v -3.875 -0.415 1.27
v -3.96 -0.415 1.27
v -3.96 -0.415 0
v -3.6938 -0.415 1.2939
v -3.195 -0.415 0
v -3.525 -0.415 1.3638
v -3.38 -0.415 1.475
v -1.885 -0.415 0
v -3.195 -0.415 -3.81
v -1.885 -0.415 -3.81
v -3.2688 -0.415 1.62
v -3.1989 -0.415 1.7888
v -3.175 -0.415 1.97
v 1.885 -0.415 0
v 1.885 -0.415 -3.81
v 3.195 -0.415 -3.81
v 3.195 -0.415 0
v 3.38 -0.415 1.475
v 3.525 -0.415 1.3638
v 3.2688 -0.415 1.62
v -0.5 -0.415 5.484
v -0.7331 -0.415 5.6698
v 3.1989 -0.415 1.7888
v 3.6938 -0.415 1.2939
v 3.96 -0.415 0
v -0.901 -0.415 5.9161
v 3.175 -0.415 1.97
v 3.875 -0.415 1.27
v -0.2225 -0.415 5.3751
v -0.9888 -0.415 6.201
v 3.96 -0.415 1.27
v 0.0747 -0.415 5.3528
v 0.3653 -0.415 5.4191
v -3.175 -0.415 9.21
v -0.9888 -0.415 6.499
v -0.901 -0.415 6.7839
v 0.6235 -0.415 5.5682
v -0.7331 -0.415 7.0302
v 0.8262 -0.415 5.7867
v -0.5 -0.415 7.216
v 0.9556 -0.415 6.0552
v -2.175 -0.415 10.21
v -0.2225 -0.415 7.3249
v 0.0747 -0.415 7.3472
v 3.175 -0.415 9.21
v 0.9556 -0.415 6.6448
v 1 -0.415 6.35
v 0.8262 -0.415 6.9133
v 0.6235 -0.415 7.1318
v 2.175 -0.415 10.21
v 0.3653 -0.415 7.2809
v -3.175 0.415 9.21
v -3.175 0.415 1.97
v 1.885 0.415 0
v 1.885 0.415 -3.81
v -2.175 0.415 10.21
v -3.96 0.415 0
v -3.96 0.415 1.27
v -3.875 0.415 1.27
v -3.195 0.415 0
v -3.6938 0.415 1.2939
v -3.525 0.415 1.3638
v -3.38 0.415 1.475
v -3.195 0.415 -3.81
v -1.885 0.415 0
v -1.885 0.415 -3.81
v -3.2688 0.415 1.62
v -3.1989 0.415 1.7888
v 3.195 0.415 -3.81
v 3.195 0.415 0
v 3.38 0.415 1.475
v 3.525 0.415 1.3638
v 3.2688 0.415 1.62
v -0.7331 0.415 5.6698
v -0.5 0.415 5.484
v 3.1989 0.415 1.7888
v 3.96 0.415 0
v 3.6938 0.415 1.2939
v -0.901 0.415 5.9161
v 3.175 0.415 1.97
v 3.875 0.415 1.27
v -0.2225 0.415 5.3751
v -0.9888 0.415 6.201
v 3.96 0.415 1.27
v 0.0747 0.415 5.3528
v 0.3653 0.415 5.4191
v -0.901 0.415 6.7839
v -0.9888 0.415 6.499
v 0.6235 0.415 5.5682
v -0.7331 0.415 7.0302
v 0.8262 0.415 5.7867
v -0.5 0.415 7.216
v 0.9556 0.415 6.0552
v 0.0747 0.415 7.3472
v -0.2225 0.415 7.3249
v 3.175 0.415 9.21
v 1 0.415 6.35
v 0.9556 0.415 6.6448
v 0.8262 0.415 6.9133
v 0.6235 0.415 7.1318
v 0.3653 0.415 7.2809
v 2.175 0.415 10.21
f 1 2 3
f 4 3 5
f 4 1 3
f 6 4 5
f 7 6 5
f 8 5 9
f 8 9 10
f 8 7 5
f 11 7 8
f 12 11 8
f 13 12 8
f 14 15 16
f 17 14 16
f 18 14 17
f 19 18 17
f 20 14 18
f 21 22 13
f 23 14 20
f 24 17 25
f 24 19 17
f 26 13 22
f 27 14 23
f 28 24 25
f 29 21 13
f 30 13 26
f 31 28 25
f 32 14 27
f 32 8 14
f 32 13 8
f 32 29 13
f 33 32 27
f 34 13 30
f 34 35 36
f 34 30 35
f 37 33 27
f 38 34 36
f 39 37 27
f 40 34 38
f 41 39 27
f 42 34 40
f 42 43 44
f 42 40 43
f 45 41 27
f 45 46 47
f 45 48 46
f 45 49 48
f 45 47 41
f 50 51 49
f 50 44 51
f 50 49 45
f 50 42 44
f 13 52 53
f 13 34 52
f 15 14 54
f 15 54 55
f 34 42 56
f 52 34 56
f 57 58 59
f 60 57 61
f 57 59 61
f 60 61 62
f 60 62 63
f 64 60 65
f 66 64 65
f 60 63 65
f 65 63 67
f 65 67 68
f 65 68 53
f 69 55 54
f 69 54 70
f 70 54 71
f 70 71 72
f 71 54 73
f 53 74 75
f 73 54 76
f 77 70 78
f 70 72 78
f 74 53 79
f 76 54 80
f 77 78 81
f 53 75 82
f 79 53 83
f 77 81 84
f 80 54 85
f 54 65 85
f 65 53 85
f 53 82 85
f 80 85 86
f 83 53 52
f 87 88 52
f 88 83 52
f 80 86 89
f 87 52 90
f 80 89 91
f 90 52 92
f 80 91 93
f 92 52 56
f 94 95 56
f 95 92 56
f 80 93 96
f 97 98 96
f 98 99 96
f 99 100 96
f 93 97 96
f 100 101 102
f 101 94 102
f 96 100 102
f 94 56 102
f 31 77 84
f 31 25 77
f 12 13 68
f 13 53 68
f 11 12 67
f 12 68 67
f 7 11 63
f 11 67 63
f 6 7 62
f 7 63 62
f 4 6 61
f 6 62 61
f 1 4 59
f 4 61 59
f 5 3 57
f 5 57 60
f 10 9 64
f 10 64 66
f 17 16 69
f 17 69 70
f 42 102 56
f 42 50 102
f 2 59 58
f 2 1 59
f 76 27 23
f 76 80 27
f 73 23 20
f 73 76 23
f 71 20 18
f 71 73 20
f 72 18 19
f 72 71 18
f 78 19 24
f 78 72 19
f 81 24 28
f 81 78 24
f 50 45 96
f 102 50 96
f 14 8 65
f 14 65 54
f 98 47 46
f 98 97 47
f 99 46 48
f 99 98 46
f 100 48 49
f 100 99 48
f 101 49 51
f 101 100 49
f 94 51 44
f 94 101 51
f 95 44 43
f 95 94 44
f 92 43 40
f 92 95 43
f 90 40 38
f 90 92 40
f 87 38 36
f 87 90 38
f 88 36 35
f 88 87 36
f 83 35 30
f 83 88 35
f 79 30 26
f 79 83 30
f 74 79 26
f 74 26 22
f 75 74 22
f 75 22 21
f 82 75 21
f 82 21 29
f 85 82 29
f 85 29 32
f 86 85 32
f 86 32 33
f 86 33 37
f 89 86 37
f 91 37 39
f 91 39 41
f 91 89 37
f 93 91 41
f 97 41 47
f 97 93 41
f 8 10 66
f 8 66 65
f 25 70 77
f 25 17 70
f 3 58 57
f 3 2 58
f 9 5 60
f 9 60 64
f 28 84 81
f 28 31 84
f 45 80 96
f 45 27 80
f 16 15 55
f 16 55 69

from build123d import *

# Parameters (mm, degrees)
F0_R     = 1
F1_DEPTH = 0.415
F2_SIZE  = 1
F3_R     = 0.7


with BuildPart() as f1:
    # F0 (on Front) → F1 (new body, symmetric)
    with BuildSketch(Plane.XZ):
        Polygon((-3.96, 1.27), (-3.96, 0), (-3.195, 0), (-3.195, -3.81), (-1.885, -3.81), (-1.885, 0), (1.885, 0), (1.885, -3.81), (3.195, -3.81), (3.195, 0), (3.96, 0), (3.96, 1.27), (3.175, 1.27), (3.175, 10.21), (-3.175, 10.21), (-3.175, 1.27), align=None)
        with Locations((0, 6.35)):
            Circle(F0_R, mode=Mode.SUBTRACT)
    extrude(amount=F1_DEPTH, both=True)

    # F2
    f2_edges = [f1.edges().sort_by_distance(p)[0] for p in [
        (3.175, 0, 10.21),
        (-3.175, 0, 10.21),
    ]]
    chamfer(f2_edges, length=F2_SIZE)

    # F3
    f3_edges = [f1.edges().sort_by_distance(p)[0] for p in [
        (3.175, 0, 1.27),
        (-3.175, 0, 1.27),
    ]]
    fillet(f3_edges, radius=F3_R)


solid = f1.part
